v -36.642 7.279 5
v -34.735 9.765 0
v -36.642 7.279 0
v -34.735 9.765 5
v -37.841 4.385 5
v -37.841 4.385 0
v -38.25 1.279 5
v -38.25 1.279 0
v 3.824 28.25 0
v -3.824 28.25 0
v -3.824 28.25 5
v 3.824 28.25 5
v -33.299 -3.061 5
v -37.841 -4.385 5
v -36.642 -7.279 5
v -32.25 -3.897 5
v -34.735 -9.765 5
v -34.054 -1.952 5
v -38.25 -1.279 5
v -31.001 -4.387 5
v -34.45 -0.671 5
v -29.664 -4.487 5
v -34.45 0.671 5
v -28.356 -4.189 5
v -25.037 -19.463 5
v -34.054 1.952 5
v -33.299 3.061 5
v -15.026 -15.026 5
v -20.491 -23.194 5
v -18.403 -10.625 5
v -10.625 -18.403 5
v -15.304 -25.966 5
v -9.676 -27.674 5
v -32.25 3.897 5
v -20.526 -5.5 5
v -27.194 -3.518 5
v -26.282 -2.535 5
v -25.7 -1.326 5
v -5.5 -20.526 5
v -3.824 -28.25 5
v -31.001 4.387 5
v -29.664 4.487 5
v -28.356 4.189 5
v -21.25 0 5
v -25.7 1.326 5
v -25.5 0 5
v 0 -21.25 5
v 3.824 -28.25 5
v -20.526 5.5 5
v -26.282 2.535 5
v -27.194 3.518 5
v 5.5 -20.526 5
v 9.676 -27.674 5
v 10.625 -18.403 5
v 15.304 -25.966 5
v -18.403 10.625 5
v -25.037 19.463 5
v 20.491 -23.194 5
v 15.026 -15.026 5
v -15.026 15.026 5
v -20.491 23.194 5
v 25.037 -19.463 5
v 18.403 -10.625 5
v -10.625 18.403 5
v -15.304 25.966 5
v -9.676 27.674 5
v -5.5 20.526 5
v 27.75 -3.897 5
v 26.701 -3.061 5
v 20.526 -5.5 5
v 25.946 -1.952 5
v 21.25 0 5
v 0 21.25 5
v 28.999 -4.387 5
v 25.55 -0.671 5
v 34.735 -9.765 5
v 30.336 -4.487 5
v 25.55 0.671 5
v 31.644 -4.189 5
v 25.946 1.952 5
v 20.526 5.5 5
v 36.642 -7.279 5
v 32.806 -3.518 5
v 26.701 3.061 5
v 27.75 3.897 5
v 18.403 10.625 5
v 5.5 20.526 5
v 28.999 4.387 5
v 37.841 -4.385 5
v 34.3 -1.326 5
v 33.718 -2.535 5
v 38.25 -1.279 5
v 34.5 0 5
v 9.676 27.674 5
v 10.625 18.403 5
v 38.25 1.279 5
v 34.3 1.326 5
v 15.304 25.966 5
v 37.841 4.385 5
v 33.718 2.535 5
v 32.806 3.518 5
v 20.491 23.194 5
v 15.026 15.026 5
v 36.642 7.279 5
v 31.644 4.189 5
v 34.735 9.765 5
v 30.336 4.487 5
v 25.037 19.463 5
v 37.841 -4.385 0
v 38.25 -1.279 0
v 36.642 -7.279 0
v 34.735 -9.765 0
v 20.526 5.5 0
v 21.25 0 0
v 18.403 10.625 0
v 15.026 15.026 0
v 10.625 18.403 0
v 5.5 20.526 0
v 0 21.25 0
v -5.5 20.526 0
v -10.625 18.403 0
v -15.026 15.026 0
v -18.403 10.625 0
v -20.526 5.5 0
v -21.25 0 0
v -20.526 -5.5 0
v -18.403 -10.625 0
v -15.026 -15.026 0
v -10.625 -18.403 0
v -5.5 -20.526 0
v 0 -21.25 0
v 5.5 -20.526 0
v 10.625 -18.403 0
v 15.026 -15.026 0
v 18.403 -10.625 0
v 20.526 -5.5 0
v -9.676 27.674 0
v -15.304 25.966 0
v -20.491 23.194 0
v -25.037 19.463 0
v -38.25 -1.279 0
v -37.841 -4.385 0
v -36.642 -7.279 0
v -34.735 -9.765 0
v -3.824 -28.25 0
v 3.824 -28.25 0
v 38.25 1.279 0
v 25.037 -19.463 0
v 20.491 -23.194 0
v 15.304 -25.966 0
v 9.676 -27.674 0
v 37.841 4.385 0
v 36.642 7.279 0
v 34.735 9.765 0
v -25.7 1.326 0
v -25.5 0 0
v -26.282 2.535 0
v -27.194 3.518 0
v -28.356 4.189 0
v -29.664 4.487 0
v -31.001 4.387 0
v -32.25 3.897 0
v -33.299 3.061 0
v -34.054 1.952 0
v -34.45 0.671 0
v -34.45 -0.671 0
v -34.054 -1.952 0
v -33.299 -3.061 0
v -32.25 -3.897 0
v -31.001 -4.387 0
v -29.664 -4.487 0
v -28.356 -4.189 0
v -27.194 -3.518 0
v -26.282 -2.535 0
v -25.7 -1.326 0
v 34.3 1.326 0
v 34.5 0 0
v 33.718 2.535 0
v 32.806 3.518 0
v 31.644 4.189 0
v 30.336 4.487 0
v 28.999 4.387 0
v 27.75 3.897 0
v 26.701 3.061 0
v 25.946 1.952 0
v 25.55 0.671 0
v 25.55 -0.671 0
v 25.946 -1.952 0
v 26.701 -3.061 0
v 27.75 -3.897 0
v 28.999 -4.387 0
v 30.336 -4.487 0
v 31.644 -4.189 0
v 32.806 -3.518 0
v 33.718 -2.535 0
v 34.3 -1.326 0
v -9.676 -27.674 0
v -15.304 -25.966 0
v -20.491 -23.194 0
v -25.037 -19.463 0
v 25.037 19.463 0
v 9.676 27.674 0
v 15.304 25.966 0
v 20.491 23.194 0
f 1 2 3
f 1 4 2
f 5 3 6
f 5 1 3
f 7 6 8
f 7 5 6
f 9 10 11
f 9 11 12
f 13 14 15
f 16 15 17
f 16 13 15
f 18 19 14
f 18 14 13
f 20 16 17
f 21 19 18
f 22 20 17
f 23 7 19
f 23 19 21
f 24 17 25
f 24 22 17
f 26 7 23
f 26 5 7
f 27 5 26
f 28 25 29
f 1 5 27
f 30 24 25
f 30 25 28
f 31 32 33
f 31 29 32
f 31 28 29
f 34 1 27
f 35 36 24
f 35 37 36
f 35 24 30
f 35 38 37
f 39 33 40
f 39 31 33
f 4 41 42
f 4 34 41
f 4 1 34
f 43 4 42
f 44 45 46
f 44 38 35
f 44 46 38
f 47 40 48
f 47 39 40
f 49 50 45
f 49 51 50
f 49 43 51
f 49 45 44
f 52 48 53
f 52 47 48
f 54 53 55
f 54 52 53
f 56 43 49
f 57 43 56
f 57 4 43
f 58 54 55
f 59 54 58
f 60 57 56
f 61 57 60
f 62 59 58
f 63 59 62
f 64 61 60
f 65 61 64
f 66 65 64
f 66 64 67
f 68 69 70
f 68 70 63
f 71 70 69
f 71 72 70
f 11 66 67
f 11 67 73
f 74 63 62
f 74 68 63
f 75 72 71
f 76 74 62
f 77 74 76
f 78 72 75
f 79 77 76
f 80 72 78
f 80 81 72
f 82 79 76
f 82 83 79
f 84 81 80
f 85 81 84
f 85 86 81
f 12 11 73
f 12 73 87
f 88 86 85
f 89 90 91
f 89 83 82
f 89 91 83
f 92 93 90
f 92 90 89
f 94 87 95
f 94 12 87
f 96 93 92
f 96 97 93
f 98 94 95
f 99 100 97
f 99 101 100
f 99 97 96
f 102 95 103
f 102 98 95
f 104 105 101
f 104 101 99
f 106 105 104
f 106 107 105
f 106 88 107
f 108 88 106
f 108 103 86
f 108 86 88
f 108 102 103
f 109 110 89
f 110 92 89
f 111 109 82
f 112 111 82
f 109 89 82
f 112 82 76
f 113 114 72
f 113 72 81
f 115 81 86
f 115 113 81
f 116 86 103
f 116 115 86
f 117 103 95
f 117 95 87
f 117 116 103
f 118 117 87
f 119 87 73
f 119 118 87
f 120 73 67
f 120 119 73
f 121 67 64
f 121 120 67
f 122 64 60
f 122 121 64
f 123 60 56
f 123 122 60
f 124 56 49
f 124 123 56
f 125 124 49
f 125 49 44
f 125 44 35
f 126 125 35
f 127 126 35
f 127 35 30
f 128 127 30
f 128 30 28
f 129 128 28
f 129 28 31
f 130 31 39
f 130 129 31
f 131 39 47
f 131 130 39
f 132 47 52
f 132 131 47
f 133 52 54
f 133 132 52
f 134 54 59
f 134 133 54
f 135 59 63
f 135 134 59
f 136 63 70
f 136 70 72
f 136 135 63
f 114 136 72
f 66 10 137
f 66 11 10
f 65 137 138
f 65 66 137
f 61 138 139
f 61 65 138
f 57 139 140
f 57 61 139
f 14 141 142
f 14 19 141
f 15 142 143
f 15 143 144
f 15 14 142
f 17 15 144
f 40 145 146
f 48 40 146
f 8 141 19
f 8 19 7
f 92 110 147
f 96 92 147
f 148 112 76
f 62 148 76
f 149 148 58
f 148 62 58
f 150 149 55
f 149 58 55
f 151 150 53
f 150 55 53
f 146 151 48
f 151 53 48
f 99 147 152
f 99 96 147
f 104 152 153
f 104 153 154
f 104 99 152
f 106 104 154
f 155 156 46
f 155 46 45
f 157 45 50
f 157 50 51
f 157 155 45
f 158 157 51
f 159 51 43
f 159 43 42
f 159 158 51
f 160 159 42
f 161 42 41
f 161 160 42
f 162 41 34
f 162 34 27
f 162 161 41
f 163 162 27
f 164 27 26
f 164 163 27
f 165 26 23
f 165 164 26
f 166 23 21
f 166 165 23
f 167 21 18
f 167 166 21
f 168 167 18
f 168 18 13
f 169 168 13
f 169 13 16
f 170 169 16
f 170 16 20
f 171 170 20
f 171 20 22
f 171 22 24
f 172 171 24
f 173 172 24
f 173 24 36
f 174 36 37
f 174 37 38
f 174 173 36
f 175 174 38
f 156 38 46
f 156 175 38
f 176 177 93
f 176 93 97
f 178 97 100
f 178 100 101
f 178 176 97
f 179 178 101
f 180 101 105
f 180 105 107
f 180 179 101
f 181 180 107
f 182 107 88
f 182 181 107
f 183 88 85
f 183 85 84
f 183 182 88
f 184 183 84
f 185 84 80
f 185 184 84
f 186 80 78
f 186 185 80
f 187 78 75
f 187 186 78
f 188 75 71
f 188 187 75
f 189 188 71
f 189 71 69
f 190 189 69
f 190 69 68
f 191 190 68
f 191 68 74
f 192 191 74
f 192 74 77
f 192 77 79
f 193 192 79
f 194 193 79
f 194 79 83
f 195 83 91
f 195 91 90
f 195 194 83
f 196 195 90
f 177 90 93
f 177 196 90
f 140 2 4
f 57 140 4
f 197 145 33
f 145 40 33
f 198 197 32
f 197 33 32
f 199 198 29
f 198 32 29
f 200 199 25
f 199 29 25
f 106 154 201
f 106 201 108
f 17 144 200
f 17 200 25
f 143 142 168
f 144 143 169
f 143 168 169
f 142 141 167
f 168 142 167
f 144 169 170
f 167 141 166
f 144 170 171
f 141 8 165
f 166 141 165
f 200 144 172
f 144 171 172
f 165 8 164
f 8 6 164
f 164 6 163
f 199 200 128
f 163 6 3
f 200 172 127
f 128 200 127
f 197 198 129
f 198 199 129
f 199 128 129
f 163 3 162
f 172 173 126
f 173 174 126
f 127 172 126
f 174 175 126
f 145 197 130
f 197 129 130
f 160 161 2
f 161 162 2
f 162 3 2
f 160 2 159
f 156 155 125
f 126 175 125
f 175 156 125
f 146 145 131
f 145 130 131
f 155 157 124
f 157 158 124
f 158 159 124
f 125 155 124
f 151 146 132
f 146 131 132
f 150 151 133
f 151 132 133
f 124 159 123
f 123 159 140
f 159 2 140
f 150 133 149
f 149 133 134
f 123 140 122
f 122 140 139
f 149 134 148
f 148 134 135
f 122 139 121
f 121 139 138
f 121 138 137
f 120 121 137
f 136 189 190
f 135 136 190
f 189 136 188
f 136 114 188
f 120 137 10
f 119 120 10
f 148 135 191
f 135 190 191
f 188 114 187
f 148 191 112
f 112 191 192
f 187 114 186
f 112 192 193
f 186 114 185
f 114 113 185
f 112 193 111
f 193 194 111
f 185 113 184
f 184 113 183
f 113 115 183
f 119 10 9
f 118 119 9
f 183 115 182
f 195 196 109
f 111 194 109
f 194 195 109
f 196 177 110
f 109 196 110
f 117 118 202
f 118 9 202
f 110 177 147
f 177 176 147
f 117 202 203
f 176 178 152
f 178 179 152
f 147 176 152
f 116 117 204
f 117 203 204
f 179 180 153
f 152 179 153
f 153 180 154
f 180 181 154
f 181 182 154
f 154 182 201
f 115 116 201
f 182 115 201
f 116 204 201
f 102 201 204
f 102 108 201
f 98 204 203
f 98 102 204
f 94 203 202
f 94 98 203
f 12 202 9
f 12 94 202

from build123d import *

# Parameters (mm, degrees)
ESQUISSE1_W        = 76.5
ESQUISSE1_H        = 56.5
ESQUISSE1_R        = 21.25
ESQUISSE1_R_2      = 4.5
BOSS_EXTRU_1_DEPTH = 5
CHANFREIN1_SIZE    = 22
CHANFREIN2_SIZE    = 22
CHANFREIN3_SIZE    = 22
CHANFREIN4_SIZE    = 22
CONG_2_R           = 30
CONG_3_R           = 30
CONG_4_R           = 30
CONG_5_R           = 30
CONG_6_R           = 12
CONG_7_R           = 12
CONG_8_R           = 12
CONG_9_R           = 12


with BuildPart() as part:
    # Esquisse1 → Boss.-Extru.1 (new body)
    with BuildSketch(Plane.XY):
        Rectangle(ESQUISSE1_W, ESQUISSE1_H)
        Circle(ESQUISSE1_R, mode=Mode.SUBTRACT)
        with Locations((30, 0)):
            Circle(ESQUISSE1_R_2, mode=Mode.SUBTRACT)
        with Locations((-30, 0)):
            Circle(ESQUISSE1_R_2, mode=Mode.SUBTRACT)
    extrude(amount=BOSS_EXTRU_1_DEPTH)

    # Chanfrein1
    chanfrein1_edges = [part.edges().sort_by_distance(p)[0] for p in [
        (38.25, 28.25, 2.5),
    ]]
    chamfer(chanfrein1_edges, length=CHANFREIN1_SIZE)

    # Chanfrein2
    chanfrein2_edges = [part.edges().sort_by_distance(p)[0] for p in [
        (-38.25, 28.25, 2.5),
    ]]
    chamfer(chanfrein2_edges, length=CHANFREIN2_SIZE)

    # Chanfrein3
    chanfrein3_edges = [part.edges().sort_by_distance(p)[0] for p in [
        (-38.25, -28.25, 2.5),
    ]]
    chamfer(chanfrein3_edges, length=CHANFREIN3_SIZE)

    # Chanfrein4
    chanfrein4_edges = [part.edges().sort_by_distance(p)[0] for p in [
        (38.25, -28.25, 2.5),
    ]]
    chamfer(chanfrein4_edges, length=CHANFREIN4_SIZE)

    # Congé2
    cong_2_edges = [part.edges().sort_by_distance(p)[0] for p in [
        (16.25, 28.25, 2.5),
    ]]
    fillet(cong_2_edges, radius=CONG_2_R)

    # Congé3
    cong_3_edges = [part.edges().sort_by_distance(p)[0] for p in [
        (-16.25, 28.25, 2.5),
    ]]
    fillet(cong_3_edges, radius=CONG_3_R)

    # Congé4
    cong_4_edges = [part.edges().sort_by_distance(p)[0] for p in [
        (16.25, -28.25, 2.5),
    ]]
    fillet(cong_4_edges, radius=CONG_4_R)

    # Congé5
    cong_5_edges = [part.edges().sort_by_distance(p)[0] for p in [
        (-16.25, -28.25, 2.5),
    ]]
    fillet(cong_5_edges, radius=CONG_5_R)

    # Congé6
    cong_6_edges = [part.edges().sort_by_distance(p)[0] for p in [
        (38.25, 6.25, 2.5),
    ]]
    fillet(cong_6_edges, radius=CONG_6_R)

    # Congé7
    cong_7_edges = [part.edges().sort_by_distance(p)[0] for p in [
        (38.25, -6.25, 2.5),
    ]]
    fillet(cong_7_edges, radius=CONG_7_R)

    # Congé8
    cong_8_edges = [part.edges().sort_by_distance(p)[0] for p in [
        (-38.25, 6.25, 2.5),
    ]]
    fillet(cong_8_edges, radius=CONG_8_R)

    # Congé9
    cong_9_edges = [part.edges().sort_by_distance(p)[0] for p in [
        (-38.25, -6.25, 2.5),
    ]]
    fillet(cong_9_edges, radius=CONG_9_R)


solid = part.part
